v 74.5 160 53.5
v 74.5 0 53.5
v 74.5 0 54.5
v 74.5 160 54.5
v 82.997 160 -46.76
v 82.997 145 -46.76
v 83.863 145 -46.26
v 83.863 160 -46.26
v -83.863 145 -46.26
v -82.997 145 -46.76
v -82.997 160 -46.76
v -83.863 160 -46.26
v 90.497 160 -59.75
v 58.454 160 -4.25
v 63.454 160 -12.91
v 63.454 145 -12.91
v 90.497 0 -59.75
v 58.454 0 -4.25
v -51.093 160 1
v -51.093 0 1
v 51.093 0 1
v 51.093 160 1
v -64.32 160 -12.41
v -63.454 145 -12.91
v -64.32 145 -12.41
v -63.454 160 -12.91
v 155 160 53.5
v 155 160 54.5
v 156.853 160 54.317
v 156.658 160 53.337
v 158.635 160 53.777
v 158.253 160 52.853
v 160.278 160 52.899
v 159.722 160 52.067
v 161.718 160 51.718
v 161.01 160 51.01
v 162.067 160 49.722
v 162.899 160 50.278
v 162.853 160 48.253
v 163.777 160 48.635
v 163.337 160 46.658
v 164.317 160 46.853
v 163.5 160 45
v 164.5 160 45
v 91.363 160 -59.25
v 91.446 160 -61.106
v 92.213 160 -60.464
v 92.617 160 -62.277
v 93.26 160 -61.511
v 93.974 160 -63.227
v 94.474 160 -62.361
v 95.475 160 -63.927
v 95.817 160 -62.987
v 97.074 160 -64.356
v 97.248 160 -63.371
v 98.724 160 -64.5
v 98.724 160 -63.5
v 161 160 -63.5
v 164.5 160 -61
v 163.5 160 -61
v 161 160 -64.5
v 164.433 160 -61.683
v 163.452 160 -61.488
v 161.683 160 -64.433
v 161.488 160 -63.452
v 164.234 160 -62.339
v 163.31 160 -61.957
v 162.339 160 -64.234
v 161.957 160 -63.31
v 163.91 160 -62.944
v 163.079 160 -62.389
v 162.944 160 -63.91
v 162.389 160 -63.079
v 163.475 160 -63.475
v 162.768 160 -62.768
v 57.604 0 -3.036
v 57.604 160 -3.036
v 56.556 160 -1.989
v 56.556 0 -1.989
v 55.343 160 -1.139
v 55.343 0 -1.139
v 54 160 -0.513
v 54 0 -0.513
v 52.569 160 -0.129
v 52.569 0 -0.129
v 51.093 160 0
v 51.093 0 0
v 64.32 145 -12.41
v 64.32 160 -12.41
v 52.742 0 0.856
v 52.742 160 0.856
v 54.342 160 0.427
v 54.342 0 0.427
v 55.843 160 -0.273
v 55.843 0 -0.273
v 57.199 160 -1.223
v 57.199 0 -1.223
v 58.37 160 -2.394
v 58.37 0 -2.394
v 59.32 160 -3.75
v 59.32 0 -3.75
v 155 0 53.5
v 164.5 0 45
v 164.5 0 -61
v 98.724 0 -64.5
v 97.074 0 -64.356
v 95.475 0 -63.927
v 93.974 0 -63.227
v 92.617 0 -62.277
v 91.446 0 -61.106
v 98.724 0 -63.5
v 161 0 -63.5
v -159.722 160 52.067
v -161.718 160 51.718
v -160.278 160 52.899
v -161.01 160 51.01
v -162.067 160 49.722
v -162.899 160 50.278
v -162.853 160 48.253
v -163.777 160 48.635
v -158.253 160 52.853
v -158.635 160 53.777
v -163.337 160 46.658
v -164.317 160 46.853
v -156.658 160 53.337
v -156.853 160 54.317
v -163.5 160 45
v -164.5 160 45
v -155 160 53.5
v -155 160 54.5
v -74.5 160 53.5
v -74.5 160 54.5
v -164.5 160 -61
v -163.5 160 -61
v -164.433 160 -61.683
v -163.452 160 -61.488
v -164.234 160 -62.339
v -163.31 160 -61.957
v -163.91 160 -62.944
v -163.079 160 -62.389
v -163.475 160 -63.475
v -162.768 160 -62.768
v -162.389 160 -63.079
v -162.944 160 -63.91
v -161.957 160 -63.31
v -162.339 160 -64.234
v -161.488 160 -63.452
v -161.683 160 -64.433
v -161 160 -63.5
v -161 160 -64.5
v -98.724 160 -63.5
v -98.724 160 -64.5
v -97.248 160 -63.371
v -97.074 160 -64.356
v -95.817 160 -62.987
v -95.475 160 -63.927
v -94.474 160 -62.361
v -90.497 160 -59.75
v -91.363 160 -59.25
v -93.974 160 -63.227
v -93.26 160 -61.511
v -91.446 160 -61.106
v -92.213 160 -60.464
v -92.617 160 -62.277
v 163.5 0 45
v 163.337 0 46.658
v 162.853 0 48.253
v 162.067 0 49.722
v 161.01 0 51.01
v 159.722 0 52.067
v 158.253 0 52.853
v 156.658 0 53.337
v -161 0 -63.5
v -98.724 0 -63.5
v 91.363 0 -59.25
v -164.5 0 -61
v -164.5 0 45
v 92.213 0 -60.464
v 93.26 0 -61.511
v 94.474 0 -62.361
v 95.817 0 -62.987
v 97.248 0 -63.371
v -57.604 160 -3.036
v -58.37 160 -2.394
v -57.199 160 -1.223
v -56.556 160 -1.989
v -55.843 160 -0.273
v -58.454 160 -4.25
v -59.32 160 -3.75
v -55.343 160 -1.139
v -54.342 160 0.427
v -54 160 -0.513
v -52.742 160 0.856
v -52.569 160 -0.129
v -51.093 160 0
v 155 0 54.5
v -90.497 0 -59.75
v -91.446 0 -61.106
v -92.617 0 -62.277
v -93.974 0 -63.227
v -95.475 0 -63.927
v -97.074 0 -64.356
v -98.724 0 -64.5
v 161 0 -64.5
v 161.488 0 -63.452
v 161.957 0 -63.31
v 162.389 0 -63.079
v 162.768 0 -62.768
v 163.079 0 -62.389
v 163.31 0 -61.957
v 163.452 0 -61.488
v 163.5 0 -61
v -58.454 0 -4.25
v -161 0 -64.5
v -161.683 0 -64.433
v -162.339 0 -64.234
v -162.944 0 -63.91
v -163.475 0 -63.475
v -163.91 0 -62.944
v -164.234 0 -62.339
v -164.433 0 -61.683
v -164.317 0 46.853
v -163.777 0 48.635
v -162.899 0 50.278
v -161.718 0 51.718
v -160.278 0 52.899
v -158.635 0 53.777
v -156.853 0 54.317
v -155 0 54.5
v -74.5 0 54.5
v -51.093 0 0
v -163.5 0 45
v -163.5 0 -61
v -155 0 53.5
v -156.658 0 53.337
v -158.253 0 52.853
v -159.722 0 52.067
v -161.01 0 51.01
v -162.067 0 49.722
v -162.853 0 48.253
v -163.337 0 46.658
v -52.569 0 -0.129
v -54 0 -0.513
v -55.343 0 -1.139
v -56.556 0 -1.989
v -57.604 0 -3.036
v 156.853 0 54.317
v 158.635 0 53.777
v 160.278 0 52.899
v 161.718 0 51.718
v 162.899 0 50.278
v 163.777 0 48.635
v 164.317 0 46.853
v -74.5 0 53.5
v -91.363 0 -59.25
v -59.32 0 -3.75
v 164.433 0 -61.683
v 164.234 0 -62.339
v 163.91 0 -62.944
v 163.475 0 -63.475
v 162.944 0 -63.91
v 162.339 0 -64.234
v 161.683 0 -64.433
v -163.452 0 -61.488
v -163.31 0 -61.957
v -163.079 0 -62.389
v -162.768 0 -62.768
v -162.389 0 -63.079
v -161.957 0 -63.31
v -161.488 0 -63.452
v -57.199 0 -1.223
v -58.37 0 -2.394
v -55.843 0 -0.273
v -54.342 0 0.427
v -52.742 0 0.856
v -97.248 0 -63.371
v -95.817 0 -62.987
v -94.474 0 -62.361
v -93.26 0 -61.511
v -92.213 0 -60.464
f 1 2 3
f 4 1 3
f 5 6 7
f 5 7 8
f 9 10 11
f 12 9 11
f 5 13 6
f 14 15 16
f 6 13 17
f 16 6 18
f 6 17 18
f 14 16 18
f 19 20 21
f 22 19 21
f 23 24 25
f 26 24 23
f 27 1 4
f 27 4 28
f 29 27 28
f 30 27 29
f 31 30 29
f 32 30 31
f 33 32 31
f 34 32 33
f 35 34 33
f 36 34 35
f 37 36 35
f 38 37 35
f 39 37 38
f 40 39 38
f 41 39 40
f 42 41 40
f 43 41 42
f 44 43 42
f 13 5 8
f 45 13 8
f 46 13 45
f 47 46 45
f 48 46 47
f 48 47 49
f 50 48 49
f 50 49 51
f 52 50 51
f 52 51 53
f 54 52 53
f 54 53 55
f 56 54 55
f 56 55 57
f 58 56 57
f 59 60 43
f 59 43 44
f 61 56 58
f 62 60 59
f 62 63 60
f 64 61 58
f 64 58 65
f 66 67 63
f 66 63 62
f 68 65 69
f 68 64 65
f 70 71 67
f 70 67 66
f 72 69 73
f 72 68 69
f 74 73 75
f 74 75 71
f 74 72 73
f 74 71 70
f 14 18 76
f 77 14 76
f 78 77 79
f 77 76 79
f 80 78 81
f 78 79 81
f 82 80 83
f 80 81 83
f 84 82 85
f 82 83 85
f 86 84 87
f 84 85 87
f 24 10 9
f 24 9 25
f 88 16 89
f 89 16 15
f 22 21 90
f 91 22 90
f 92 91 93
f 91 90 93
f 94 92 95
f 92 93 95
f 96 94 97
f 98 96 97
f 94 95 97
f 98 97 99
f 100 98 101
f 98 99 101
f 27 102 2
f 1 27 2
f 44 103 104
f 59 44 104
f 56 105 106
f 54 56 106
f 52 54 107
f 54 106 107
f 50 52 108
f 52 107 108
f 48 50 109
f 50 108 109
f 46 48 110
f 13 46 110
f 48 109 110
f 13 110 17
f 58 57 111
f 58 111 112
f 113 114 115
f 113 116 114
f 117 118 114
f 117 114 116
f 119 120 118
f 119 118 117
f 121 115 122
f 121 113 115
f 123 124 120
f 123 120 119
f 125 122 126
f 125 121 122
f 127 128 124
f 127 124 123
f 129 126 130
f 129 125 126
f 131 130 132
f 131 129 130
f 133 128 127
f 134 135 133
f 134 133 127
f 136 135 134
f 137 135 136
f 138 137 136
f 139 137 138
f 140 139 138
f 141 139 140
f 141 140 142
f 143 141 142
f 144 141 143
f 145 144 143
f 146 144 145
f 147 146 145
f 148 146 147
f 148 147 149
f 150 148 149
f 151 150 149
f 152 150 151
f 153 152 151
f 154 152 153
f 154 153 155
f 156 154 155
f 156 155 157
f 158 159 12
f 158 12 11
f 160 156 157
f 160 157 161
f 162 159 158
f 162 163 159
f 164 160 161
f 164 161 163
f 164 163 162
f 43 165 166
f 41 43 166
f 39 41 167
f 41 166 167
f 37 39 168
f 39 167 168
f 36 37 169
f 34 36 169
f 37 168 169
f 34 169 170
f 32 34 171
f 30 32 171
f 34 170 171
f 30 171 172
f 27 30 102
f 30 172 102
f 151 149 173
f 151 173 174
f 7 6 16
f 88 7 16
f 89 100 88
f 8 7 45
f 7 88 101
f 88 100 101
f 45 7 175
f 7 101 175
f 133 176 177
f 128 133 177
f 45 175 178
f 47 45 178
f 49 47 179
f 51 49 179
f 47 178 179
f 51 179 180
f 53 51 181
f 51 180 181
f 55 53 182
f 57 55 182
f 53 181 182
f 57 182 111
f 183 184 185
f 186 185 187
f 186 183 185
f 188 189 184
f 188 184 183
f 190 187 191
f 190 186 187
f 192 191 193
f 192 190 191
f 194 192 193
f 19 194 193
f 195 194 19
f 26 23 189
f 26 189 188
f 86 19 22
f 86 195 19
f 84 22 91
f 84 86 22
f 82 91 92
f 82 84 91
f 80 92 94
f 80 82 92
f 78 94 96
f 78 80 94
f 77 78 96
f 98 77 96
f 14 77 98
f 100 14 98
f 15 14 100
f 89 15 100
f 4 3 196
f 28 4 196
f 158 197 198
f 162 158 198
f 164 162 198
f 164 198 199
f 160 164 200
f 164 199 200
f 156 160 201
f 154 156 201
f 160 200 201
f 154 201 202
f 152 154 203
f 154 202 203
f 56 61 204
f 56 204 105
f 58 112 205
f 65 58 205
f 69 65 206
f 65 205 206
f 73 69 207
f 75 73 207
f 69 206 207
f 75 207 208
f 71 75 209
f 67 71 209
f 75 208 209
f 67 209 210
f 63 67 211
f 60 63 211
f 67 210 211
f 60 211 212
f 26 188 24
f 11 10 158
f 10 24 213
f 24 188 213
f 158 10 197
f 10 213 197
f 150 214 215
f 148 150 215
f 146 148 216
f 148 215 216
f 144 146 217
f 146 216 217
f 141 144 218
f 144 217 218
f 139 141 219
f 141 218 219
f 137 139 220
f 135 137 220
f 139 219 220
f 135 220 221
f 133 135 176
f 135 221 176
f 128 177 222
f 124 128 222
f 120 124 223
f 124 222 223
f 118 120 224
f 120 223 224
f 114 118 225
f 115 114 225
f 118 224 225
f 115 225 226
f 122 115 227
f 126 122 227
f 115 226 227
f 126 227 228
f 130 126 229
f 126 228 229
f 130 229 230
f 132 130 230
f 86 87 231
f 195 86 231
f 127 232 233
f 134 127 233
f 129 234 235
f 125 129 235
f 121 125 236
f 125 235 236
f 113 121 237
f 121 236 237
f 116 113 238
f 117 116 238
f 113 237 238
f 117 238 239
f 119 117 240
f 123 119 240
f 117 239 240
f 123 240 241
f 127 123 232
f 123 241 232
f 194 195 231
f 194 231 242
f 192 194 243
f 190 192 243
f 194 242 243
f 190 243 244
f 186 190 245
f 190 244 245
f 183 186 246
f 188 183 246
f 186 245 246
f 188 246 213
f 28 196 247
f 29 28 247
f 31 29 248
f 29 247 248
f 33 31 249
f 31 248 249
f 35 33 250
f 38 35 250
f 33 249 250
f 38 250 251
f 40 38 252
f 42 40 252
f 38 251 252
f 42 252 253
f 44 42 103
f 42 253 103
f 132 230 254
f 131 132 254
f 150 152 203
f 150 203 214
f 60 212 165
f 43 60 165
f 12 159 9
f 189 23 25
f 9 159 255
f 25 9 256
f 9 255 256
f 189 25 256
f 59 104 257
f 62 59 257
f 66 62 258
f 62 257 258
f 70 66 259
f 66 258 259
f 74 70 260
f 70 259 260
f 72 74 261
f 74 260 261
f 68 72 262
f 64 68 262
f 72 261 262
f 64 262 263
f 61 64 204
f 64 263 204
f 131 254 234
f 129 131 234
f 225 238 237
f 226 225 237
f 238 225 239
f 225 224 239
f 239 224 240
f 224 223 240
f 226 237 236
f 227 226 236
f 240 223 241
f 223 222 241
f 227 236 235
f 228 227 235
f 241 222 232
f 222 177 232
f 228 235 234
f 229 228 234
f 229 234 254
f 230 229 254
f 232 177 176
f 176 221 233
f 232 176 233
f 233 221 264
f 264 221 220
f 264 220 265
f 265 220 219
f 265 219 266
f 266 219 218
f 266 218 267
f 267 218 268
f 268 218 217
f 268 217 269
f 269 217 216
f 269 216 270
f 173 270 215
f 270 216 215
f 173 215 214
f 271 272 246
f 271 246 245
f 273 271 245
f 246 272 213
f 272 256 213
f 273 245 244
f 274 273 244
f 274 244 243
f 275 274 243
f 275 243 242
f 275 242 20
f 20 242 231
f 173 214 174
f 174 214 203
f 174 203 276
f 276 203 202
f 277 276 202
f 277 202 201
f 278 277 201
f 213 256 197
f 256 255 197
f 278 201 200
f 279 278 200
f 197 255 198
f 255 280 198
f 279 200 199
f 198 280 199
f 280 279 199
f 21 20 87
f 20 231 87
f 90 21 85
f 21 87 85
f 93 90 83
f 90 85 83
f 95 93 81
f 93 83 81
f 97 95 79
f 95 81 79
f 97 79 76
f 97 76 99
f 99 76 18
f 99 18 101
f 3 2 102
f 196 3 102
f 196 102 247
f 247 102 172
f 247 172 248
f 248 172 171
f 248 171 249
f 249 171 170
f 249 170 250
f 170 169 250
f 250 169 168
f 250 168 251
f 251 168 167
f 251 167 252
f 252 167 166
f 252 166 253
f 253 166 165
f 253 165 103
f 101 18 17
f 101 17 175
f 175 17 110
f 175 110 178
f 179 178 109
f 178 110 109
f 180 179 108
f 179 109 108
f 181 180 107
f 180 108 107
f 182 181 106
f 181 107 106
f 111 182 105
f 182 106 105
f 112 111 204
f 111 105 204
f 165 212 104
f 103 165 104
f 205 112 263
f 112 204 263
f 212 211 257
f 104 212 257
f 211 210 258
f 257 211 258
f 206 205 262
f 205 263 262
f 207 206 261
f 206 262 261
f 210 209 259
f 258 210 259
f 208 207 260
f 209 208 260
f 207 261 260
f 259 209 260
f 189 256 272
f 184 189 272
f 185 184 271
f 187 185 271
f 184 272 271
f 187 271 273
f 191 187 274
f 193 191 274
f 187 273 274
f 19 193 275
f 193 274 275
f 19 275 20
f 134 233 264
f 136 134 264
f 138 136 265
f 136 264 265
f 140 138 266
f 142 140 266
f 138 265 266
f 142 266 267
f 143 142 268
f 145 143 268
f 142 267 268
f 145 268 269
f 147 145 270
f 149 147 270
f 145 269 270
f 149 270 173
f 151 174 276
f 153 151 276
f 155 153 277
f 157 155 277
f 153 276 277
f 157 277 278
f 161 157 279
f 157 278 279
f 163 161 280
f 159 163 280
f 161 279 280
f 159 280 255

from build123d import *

# Parameters (mm, degrees)
T_LE_DE_BASE_PLI_E1_DEPTH = 160
ENL_V_MAT_EXTRU_1_REACH   = 277.896
ESQUISSE2_W               = 39.08587988
ESQUISSE2_H               = 15


# Read off the part's stored shape, not the designer's step: Tôle de base pliée1
with BuildPart() as part:
    # Tôle de base pliée1 outline → Tôle de base pliée1 (new body)
    with BuildSketch(Plane(origin=(0, 0, 0), x_dir=(1, 0, 0), z_dir=(0, 1, 0))):
        with BuildLine():
            Line((155, -53.5), (74.5, -53.5))
            Line((74.5, -53.5), (74.5, -54.5))
            Line((74.5, -54.5), (155, -54.5))
            ThreePointArc((155, -54.5), (161.717514421, -51.717514421), (164.5, -45))
            Line((164.5, -45), (164.5, 61))
            ThreePointArc((164.5, 61), (163.474873734, 63.474873734), (161, 64.5))
            Line((161, 64.5), (98.72391992, 64.5))
            ThreePointArc((98.72391992, 64.5), (93.97391992, 63.227241336), (90.496678584, 59.75))
            Line((90.496678584, 59.75), (58.453738644, 4.25))
            ThreePointArc((58.453738644, 4.25), (55.342522712, 1.138784068), (51.092522712, 0))
            Line((51.092522712, 0), (-51.092522712, 0))
            ThreePointArc((-51.092522712, 0), (-55.342522712, 1.138784068), (-58.453738644, 4.25))
            Line((-58.453738644, 4.25), (-90.496678584, 59.75))
            ThreePointArc((-90.496678584, 59.75), (-93.97391992, 63.227241336), (-98.72391992, 64.5))
            Line((-98.72391992, 64.5), (-161, 64.5))
            ThreePointArc((-161, 64.5), (-163.474873734, 63.474873734), (-164.5, 61))
            Line((-164.5, 61), (-164.5, -45))
            ThreePointArc((-164.5, -45), (-161.717514421, -51.717514421), (-155, -54.5))
            Line((-155, -54.5), (-74.5, -54.5))
            Line((-74.5, -54.5), (-74.5, -53.5))
            Line((-74.5, -53.5), (-155, -53.5))
            ThreePointArc((-155, -53.5), (-161.01040764, -51.01040764), (-163.5, -45))
            Line((-163.5, -45), (-163.5, 61))
            ThreePointArc((-163.5, 61), (-162.767766953, 62.767766953), (-161, 63.5))
            Line((-161, 63.5), (-98.72391992, 63.5))
            ThreePointArc((-98.72391992, 63.5), (-94.47391992, 62.361215932), (-91.362703988, 59.25))
            Line((-91.362703988, 59.25), (-59.319764048, 3.75))
            ThreePointArc((-59.319764048, 3.75), (-55.842522712, 0.272758664), (-51.092522712, -1))
            Line((-51.092522712, -1), (51.092522712, -1))
            ThreePointArc((51.092522712, -1), (55.842522712, 0.272758664), (59.319764048, 3.75))
            Line((59.319764048, 3.75), (91.362703988, 59.25))
            ThreePointArc((91.362703988, 59.25), (94.47391992, 62.361215932), (98.72391992, 63.5))
            Line((98.72391992, 63.5), (161, 63.5))
            ThreePointArc((161, 63.5), (162.767766953, 62.767766953), (163.5, 61))
            Line((163.5, 61), (163.5, -45))
            ThreePointArc((163.5, -45), (161.01040764, -51.01040764), (155, -53.5))
        make_face()
    extrude(amount=T_LE_DE_BASE_PLI_E1_DEPTH)

    # Esquisse2 → Enlèv. mat.-Extru.1 (cut, up to next)
    with BuildSketch(Plane(origin=(42, 0, 24.248711306), x_dir=(-0.4999999999999975, 0, 0.86602540378444), z_dir=(-0.86602540378444, 0, -0.4999999999999975)), mode=Mode.PRIVATE) as enl_v_mat_extru_1_sk1:
        with Locations((-62.450417228, 152.5)):
            Rectangle(ESQUISSE2_W, ESQUISSE2_H)
    enl_v_mat_extru_1_tool1 = extrude(enl_v_mat_extru_1_sk1.sketch, amount=-ENL_V_MAT_EXTRU_1_REACH, mode=Mode.PRIVATE) & part.part
    enl_v_mat_extru_1 = enl_v_mat_extru_1_tool1.solids().sort_by_distance((73.225209, 152.5, -29.834936))[0]
    add(enl_v_mat_extru_1, mode=Mode.SUBTRACT)

    # Symétrie1: Enlèv. mat.-Extru.1 across plane
    add(enl_v_mat_extru_1.mirror(Plane(origin=(0, 0, 0), x_dir=(0, 0, 1), z_dir=(1, 0, 0))), mode=Mode.SUBTRACT)


solid = part.part
